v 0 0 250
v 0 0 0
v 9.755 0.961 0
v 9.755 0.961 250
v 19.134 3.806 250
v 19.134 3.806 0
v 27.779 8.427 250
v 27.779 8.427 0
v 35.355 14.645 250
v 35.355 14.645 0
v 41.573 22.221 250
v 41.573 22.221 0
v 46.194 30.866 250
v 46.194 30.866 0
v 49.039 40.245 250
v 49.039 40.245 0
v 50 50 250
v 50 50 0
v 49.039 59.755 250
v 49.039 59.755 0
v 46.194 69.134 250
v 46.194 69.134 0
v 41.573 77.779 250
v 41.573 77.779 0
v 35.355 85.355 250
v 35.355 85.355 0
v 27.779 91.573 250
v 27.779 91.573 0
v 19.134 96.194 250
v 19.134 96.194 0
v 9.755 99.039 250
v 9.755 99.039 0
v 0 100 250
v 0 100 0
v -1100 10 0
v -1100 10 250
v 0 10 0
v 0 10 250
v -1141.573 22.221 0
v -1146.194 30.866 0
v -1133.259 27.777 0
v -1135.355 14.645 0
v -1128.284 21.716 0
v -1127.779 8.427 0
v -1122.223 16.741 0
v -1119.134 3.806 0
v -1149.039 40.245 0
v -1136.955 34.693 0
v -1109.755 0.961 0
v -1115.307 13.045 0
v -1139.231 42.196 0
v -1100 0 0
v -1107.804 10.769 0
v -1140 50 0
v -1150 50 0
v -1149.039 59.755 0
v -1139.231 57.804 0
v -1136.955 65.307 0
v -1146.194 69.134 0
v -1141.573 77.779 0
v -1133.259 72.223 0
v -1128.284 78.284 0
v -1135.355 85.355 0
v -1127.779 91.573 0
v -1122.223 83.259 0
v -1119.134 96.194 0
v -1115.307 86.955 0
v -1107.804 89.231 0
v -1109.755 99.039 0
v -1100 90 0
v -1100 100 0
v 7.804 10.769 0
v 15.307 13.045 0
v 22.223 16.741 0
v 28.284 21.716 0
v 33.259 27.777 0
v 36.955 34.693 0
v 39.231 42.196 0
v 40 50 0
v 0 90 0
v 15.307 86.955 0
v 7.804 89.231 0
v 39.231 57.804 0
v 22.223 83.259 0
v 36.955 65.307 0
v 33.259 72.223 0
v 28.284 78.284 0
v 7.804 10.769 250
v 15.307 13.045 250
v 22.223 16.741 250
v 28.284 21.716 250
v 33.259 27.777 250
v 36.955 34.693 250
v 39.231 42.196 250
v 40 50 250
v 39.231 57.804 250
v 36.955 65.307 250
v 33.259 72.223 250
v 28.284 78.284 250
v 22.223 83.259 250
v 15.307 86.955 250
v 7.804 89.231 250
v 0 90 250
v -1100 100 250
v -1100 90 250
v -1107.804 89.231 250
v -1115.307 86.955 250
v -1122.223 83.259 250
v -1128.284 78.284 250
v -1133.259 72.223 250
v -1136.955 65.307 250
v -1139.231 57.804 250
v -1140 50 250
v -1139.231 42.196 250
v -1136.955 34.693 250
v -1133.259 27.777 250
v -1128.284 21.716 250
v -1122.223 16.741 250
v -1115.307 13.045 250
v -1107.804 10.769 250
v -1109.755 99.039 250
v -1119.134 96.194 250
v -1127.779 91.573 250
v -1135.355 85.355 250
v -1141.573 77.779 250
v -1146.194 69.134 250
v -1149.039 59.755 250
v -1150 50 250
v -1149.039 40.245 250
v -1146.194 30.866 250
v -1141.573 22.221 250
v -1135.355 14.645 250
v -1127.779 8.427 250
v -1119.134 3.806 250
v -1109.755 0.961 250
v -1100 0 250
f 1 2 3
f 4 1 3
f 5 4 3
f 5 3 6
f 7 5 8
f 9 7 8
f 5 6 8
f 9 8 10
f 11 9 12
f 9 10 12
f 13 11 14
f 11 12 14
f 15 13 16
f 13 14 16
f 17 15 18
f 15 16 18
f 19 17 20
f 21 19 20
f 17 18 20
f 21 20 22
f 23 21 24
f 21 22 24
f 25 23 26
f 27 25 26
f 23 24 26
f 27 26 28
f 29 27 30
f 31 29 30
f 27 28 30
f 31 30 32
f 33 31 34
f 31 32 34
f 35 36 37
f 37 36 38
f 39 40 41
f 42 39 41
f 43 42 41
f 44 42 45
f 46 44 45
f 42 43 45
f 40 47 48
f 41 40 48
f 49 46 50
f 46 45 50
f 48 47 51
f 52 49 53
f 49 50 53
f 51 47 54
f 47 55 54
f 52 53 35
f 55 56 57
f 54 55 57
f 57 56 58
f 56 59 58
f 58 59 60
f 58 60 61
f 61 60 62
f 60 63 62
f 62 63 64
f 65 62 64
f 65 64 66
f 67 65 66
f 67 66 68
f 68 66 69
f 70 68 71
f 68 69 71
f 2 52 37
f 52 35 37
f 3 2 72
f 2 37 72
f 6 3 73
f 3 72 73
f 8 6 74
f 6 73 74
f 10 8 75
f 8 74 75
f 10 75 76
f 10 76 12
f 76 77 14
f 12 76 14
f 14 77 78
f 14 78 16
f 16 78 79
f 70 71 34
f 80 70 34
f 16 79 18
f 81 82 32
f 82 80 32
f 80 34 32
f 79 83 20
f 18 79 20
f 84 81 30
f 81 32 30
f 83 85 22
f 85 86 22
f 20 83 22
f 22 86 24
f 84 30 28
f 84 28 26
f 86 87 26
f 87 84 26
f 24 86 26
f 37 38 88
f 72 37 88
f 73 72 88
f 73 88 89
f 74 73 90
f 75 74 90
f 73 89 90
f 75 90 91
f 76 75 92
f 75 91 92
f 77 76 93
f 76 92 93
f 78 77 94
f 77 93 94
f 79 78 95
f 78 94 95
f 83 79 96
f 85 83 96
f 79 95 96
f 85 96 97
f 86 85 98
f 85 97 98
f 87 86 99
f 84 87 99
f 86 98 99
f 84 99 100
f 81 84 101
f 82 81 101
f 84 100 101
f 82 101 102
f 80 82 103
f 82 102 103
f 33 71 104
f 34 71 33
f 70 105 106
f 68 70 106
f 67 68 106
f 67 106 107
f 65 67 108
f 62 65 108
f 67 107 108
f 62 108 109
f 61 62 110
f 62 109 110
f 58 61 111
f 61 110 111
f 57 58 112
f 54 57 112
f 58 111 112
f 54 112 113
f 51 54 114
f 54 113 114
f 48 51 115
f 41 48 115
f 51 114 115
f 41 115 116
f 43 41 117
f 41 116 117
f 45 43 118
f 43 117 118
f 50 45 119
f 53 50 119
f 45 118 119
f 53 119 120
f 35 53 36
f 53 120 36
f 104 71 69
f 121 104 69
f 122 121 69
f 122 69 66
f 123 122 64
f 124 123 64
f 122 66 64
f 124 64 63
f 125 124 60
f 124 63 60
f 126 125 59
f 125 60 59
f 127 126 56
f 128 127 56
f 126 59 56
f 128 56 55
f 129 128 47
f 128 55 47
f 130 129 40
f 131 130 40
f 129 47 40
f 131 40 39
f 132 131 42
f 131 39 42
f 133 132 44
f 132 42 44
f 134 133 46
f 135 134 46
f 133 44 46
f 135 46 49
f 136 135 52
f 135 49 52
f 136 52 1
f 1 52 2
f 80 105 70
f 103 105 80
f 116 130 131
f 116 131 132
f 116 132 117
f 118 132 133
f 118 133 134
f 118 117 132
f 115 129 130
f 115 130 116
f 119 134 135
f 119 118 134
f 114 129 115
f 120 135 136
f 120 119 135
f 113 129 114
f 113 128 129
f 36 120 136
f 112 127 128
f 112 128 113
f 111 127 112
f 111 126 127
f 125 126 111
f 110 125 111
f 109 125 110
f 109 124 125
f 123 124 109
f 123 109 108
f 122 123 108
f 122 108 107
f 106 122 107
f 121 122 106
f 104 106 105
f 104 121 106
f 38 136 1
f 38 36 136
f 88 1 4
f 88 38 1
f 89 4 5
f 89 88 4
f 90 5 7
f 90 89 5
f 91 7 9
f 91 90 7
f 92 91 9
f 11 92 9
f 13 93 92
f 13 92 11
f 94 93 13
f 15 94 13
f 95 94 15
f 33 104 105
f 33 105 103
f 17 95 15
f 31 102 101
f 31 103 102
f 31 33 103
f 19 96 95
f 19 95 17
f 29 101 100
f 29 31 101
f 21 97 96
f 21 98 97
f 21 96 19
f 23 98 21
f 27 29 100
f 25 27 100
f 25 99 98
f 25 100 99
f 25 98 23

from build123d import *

# Parameters (mm, degrees)
SKETCH2_R           = 50
SKETCH2_W           = 1100
SKETCH2_H           = 100
BOSS_EXTRUDE1_DEPTH = 250
SKETCH3_R           = 40
SKETCH3_W           = 1100
SKETCH3_H           = 80
CUT_EXTRUDE1_DEPTH  = 1182.101181102


with BuildPart() as part:
    # Sketch2 → Boss-Extrude1 (new body)
    with BuildSketch(Plane.XY):
        with Locations((-1100, 50)):
            Circle(SKETCH2_R)
        with Locations((0, 50)):
            Circle(SKETCH2_R)
        with Locations((-550, 50)):
            Rectangle(SKETCH2_W, SKETCH2_H)
    extrude(amount=BOSS_EXTRUDE1_DEPTH)

    # Sketch3 → Cut-Extrude1 (cut, through all)
    with BuildSketch(Plane.XY.offset(250)):
        with Locations((-1100, 50)):
            Circle(SKETCH3_R)
        with Locations((0, 50)):
            Circle(SKETCH3_R)
        with Locations((-550, 50)):
            Rectangle(SKETCH3_W, SKETCH3_H)
    extrude(amount=-CUT_EXTRUDE1_DEPTH, mode=Mode.SUBTRACT)


solid = part.part
